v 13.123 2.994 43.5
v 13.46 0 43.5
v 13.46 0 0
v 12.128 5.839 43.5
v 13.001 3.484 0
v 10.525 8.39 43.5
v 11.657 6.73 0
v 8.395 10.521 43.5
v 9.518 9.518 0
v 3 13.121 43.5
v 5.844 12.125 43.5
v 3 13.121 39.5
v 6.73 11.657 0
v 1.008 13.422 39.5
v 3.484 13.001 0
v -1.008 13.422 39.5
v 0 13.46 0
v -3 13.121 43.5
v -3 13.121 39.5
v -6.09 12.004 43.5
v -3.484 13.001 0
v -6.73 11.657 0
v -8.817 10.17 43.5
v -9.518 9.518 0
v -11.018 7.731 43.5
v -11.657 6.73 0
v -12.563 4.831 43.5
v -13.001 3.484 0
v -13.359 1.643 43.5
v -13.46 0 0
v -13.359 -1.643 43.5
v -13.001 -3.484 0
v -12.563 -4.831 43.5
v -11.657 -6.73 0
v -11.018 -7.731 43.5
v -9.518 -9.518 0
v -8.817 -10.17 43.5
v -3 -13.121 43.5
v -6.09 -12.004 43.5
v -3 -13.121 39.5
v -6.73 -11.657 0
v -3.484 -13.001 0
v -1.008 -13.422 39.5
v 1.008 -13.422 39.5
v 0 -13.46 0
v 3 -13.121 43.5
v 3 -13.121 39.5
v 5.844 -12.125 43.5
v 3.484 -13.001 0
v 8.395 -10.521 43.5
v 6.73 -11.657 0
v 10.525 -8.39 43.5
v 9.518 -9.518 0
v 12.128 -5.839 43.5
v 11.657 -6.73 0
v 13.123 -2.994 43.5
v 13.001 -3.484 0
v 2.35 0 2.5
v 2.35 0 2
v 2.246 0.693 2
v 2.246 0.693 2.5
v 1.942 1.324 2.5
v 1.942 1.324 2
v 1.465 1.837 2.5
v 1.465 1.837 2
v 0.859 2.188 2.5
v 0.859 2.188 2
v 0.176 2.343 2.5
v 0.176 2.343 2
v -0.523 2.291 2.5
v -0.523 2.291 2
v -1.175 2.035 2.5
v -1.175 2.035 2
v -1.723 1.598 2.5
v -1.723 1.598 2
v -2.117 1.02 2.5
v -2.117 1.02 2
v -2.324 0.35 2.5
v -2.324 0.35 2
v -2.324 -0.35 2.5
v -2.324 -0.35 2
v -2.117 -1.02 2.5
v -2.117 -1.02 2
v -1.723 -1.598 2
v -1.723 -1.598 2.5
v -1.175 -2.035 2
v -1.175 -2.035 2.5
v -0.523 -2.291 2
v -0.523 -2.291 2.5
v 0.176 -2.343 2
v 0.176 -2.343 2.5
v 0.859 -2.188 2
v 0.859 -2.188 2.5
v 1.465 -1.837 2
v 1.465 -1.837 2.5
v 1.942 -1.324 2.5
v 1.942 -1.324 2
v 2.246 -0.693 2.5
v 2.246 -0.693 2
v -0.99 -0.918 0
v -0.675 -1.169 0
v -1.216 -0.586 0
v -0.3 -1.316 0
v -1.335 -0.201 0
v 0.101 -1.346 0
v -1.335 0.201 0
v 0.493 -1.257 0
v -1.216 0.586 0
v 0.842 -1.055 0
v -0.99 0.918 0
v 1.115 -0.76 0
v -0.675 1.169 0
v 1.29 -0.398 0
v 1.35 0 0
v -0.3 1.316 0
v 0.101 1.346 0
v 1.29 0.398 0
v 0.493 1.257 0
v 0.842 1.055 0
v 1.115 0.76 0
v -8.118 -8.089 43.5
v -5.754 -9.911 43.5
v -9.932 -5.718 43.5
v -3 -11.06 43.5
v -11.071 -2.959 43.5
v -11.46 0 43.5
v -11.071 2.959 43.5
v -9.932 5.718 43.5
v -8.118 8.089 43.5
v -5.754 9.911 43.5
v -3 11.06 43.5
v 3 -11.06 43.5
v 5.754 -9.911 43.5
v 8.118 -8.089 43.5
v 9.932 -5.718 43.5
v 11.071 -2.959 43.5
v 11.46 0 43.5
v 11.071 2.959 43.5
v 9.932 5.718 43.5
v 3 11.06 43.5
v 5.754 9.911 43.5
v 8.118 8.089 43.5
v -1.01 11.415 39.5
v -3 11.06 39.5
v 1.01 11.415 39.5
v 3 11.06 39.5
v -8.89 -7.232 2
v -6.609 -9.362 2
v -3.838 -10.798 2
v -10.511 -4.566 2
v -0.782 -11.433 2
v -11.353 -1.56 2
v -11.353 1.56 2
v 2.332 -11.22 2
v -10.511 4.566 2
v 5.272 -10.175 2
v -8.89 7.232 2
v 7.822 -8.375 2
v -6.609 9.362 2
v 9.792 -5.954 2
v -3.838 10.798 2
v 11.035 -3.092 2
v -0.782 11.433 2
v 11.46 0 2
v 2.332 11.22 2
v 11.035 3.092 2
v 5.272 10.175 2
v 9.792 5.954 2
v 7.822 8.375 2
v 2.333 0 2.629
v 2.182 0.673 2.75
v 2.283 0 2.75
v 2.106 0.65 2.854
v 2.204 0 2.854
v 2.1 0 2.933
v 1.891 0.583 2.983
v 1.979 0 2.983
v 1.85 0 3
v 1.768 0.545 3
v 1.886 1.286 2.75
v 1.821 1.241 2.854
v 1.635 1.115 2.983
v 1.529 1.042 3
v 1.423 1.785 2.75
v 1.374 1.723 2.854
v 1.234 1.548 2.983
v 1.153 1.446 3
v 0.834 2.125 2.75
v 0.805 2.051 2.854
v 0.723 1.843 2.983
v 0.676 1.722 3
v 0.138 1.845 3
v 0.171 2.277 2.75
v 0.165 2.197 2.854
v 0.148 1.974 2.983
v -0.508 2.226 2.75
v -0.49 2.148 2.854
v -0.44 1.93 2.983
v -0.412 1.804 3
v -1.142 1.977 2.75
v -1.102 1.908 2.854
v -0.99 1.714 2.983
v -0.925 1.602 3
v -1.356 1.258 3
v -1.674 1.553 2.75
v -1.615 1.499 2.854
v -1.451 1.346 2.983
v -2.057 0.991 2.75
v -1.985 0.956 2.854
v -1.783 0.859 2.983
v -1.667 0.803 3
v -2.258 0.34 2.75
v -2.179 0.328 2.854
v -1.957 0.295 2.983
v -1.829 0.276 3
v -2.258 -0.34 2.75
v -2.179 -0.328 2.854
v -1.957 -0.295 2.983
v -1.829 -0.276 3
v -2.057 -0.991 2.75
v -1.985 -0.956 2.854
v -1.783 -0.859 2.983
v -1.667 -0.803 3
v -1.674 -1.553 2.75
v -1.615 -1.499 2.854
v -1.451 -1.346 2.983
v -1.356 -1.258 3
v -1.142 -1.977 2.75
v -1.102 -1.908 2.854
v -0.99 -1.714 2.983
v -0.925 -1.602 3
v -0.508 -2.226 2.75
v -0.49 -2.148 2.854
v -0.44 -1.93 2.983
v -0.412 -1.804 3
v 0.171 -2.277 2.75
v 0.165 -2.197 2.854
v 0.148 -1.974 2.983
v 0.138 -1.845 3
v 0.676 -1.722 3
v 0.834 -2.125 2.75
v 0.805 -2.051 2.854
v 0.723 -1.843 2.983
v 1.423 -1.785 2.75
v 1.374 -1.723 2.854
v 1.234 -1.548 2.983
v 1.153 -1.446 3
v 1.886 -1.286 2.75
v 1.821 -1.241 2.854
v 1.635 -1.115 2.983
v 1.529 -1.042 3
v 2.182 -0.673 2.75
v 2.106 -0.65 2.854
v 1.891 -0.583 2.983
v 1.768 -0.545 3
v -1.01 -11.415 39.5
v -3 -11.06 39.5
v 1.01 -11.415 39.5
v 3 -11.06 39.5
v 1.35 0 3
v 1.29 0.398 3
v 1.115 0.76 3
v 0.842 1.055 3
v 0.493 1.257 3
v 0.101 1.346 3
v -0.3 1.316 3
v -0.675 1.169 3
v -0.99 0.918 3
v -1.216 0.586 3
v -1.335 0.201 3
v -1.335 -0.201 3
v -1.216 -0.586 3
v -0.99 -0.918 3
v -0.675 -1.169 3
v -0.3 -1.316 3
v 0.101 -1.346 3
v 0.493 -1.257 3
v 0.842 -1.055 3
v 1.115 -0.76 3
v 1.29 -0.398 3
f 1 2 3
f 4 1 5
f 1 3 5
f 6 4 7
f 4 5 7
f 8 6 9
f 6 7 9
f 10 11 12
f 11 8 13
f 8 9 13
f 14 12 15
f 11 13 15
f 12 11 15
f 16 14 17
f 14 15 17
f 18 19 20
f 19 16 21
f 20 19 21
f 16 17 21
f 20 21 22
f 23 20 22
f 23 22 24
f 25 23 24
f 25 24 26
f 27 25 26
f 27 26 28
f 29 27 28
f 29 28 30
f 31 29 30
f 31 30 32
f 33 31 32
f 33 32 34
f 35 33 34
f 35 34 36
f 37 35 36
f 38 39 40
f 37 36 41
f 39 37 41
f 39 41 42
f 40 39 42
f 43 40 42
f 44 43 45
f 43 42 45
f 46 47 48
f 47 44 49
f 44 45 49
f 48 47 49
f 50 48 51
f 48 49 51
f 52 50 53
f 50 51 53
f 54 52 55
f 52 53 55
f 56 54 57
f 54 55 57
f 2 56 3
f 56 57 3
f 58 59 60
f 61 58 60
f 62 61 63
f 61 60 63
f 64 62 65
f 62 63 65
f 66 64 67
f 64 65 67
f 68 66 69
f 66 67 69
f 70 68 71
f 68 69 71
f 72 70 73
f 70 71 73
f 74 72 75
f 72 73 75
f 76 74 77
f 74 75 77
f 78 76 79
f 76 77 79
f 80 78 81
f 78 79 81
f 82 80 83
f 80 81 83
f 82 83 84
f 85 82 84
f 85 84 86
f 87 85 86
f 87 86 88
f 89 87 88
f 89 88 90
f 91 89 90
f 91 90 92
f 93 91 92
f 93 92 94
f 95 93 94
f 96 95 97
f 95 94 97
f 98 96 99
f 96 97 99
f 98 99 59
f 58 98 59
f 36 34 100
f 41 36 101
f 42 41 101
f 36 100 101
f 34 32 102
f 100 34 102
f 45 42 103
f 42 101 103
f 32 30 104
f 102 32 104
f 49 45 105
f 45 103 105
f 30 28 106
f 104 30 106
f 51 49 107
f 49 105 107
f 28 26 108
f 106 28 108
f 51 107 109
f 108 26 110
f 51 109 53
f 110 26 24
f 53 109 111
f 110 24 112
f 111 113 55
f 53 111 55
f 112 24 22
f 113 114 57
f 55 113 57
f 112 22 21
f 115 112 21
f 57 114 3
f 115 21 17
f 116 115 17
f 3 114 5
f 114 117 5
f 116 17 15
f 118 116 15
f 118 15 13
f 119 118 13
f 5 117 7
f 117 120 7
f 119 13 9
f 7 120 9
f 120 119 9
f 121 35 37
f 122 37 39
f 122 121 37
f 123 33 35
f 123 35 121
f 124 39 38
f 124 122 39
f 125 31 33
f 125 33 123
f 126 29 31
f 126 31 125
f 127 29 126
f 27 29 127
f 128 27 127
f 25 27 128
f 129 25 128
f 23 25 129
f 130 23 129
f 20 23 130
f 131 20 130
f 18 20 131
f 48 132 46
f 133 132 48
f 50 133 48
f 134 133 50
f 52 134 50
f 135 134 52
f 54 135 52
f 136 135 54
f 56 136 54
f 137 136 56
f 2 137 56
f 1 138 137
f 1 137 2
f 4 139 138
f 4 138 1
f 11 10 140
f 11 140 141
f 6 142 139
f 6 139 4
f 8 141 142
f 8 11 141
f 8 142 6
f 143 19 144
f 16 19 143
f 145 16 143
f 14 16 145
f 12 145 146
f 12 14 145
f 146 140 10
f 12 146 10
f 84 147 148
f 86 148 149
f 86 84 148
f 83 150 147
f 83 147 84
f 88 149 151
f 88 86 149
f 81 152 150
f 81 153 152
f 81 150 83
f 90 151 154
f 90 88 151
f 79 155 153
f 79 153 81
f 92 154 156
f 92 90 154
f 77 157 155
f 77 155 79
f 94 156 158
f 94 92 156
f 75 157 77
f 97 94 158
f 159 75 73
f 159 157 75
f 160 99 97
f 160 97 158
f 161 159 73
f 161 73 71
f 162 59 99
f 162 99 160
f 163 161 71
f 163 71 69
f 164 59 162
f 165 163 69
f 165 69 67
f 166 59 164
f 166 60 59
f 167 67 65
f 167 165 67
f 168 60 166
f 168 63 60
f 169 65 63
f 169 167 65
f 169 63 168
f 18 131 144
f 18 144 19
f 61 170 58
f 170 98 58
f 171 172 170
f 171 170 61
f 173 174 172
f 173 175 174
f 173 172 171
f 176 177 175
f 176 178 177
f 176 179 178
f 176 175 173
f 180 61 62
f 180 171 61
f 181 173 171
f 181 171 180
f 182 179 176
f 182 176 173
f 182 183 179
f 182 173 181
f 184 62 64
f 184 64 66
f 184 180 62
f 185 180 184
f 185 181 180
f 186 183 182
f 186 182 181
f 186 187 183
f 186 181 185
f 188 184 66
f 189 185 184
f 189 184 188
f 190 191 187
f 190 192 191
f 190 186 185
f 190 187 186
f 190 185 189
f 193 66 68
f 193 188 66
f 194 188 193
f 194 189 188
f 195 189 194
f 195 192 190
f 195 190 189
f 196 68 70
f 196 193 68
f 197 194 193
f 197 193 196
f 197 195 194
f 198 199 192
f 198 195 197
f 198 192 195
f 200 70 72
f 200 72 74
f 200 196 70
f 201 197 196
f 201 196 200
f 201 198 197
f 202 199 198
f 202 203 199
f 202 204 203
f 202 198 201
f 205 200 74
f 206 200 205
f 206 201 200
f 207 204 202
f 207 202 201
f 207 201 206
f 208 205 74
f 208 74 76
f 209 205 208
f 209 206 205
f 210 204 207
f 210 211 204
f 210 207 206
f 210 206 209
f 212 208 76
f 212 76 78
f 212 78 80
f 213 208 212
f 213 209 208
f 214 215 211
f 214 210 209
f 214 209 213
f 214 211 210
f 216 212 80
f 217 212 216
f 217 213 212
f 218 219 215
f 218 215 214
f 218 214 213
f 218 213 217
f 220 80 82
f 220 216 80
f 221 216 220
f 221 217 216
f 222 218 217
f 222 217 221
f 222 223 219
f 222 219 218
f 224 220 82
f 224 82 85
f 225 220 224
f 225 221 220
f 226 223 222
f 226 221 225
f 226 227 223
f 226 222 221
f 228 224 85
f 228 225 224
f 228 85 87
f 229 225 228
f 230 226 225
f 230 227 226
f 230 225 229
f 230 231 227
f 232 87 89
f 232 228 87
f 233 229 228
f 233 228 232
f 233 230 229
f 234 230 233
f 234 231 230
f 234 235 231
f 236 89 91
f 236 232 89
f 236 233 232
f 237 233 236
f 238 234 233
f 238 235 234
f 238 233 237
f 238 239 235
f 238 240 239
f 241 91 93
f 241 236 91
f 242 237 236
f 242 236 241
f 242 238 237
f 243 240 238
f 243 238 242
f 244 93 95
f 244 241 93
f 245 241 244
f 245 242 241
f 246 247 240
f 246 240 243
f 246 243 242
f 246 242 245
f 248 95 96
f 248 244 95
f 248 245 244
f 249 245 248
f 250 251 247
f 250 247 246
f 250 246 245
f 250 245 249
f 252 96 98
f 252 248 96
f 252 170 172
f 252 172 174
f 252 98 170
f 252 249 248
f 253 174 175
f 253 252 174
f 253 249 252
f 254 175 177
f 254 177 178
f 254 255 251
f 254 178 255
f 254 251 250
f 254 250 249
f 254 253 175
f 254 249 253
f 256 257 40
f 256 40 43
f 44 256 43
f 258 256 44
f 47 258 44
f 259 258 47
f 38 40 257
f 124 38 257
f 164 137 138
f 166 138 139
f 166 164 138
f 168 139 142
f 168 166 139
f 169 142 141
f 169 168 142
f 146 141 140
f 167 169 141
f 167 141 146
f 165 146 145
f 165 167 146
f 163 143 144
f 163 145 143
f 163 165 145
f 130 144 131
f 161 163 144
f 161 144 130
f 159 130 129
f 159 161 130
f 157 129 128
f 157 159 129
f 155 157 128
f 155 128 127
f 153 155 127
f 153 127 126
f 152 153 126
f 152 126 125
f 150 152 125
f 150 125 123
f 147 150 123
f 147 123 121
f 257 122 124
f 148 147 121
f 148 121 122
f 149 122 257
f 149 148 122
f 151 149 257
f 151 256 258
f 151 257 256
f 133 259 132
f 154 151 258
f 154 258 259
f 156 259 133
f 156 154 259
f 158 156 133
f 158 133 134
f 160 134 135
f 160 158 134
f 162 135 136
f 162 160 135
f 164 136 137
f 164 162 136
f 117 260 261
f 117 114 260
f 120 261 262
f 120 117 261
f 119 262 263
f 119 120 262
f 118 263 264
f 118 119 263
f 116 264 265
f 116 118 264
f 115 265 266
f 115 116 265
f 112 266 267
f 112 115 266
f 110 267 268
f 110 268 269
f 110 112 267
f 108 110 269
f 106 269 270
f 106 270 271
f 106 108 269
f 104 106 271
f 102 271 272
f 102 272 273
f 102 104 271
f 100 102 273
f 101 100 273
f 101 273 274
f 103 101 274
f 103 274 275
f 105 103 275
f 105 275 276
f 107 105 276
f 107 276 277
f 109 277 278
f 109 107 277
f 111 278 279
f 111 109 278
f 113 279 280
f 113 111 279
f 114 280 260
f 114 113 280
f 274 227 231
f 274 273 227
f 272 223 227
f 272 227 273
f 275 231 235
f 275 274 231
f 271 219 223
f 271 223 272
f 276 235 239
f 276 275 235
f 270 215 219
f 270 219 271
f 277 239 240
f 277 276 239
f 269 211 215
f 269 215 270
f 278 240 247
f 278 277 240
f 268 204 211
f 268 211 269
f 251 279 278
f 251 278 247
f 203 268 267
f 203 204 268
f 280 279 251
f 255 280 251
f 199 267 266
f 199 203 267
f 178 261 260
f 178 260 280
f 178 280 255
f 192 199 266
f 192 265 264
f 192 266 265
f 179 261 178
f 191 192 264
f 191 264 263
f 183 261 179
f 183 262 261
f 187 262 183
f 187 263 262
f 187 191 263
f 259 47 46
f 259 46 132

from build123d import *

# Parameters (mm, degrees)
F0_R     = 13.46
F1_DEPTH = 43.5
F2_T     = -2
F3_W     = 6
F3_H     = 30
F4_DEPTH = 4
F5_R     = 1.35
F6_DEPTH = 43.501
F7_R     = 2.35
F7_R_2   = 1.35
F8_DEPTH = 1
F9_R     = 0.5


with BuildPart() as f1:
    # F0 (on Top) → F1 (new body)
    with BuildSketch(Plane.XY):
        Circle(F0_R)
    extrude(amount=F1_DEPTH)

    # F2
    f2_openings = [f1.faces().sort_by_distance(p)[0] for p in [
        (0, 0, 43.5),
    ]]
    offset(amount=F2_T, openings=f2_openings)

    # F3 (on face) → F4 (cut)
    with BuildSketch(Plane.XY.offset(43.5)):
        Rectangle(F3_W, F3_H)
    extrude(amount=-F4_DEPTH, mode=Mode.SUBTRACT)

    # F5 (on face) → F6 (cut, through all)
    with BuildSketch(Plane(origin=(0, 0, 0), x_dir=(1, 0, 0), z_dir=(0, 0, -1))):
        Circle(F5_R)
    extrude(amount=-F6_DEPTH, mode=Mode.SUBTRACT)

    # F7 (on face) → F8 (join)
    with BuildSketch(Plane.XY.offset(2)):
        Circle(F7_R)
        Circle(F7_R_2, mode=Mode.SUBTRACT)
    extrude(amount=F8_DEPTH)

    # F9
    f9_edges = [f1.edges().sort_by_distance(p)[0] for p in [
        (-2.35, 0, 3),
    ]]
    fillet(f9_edges, radius=F9_R)


solid = f1.part
